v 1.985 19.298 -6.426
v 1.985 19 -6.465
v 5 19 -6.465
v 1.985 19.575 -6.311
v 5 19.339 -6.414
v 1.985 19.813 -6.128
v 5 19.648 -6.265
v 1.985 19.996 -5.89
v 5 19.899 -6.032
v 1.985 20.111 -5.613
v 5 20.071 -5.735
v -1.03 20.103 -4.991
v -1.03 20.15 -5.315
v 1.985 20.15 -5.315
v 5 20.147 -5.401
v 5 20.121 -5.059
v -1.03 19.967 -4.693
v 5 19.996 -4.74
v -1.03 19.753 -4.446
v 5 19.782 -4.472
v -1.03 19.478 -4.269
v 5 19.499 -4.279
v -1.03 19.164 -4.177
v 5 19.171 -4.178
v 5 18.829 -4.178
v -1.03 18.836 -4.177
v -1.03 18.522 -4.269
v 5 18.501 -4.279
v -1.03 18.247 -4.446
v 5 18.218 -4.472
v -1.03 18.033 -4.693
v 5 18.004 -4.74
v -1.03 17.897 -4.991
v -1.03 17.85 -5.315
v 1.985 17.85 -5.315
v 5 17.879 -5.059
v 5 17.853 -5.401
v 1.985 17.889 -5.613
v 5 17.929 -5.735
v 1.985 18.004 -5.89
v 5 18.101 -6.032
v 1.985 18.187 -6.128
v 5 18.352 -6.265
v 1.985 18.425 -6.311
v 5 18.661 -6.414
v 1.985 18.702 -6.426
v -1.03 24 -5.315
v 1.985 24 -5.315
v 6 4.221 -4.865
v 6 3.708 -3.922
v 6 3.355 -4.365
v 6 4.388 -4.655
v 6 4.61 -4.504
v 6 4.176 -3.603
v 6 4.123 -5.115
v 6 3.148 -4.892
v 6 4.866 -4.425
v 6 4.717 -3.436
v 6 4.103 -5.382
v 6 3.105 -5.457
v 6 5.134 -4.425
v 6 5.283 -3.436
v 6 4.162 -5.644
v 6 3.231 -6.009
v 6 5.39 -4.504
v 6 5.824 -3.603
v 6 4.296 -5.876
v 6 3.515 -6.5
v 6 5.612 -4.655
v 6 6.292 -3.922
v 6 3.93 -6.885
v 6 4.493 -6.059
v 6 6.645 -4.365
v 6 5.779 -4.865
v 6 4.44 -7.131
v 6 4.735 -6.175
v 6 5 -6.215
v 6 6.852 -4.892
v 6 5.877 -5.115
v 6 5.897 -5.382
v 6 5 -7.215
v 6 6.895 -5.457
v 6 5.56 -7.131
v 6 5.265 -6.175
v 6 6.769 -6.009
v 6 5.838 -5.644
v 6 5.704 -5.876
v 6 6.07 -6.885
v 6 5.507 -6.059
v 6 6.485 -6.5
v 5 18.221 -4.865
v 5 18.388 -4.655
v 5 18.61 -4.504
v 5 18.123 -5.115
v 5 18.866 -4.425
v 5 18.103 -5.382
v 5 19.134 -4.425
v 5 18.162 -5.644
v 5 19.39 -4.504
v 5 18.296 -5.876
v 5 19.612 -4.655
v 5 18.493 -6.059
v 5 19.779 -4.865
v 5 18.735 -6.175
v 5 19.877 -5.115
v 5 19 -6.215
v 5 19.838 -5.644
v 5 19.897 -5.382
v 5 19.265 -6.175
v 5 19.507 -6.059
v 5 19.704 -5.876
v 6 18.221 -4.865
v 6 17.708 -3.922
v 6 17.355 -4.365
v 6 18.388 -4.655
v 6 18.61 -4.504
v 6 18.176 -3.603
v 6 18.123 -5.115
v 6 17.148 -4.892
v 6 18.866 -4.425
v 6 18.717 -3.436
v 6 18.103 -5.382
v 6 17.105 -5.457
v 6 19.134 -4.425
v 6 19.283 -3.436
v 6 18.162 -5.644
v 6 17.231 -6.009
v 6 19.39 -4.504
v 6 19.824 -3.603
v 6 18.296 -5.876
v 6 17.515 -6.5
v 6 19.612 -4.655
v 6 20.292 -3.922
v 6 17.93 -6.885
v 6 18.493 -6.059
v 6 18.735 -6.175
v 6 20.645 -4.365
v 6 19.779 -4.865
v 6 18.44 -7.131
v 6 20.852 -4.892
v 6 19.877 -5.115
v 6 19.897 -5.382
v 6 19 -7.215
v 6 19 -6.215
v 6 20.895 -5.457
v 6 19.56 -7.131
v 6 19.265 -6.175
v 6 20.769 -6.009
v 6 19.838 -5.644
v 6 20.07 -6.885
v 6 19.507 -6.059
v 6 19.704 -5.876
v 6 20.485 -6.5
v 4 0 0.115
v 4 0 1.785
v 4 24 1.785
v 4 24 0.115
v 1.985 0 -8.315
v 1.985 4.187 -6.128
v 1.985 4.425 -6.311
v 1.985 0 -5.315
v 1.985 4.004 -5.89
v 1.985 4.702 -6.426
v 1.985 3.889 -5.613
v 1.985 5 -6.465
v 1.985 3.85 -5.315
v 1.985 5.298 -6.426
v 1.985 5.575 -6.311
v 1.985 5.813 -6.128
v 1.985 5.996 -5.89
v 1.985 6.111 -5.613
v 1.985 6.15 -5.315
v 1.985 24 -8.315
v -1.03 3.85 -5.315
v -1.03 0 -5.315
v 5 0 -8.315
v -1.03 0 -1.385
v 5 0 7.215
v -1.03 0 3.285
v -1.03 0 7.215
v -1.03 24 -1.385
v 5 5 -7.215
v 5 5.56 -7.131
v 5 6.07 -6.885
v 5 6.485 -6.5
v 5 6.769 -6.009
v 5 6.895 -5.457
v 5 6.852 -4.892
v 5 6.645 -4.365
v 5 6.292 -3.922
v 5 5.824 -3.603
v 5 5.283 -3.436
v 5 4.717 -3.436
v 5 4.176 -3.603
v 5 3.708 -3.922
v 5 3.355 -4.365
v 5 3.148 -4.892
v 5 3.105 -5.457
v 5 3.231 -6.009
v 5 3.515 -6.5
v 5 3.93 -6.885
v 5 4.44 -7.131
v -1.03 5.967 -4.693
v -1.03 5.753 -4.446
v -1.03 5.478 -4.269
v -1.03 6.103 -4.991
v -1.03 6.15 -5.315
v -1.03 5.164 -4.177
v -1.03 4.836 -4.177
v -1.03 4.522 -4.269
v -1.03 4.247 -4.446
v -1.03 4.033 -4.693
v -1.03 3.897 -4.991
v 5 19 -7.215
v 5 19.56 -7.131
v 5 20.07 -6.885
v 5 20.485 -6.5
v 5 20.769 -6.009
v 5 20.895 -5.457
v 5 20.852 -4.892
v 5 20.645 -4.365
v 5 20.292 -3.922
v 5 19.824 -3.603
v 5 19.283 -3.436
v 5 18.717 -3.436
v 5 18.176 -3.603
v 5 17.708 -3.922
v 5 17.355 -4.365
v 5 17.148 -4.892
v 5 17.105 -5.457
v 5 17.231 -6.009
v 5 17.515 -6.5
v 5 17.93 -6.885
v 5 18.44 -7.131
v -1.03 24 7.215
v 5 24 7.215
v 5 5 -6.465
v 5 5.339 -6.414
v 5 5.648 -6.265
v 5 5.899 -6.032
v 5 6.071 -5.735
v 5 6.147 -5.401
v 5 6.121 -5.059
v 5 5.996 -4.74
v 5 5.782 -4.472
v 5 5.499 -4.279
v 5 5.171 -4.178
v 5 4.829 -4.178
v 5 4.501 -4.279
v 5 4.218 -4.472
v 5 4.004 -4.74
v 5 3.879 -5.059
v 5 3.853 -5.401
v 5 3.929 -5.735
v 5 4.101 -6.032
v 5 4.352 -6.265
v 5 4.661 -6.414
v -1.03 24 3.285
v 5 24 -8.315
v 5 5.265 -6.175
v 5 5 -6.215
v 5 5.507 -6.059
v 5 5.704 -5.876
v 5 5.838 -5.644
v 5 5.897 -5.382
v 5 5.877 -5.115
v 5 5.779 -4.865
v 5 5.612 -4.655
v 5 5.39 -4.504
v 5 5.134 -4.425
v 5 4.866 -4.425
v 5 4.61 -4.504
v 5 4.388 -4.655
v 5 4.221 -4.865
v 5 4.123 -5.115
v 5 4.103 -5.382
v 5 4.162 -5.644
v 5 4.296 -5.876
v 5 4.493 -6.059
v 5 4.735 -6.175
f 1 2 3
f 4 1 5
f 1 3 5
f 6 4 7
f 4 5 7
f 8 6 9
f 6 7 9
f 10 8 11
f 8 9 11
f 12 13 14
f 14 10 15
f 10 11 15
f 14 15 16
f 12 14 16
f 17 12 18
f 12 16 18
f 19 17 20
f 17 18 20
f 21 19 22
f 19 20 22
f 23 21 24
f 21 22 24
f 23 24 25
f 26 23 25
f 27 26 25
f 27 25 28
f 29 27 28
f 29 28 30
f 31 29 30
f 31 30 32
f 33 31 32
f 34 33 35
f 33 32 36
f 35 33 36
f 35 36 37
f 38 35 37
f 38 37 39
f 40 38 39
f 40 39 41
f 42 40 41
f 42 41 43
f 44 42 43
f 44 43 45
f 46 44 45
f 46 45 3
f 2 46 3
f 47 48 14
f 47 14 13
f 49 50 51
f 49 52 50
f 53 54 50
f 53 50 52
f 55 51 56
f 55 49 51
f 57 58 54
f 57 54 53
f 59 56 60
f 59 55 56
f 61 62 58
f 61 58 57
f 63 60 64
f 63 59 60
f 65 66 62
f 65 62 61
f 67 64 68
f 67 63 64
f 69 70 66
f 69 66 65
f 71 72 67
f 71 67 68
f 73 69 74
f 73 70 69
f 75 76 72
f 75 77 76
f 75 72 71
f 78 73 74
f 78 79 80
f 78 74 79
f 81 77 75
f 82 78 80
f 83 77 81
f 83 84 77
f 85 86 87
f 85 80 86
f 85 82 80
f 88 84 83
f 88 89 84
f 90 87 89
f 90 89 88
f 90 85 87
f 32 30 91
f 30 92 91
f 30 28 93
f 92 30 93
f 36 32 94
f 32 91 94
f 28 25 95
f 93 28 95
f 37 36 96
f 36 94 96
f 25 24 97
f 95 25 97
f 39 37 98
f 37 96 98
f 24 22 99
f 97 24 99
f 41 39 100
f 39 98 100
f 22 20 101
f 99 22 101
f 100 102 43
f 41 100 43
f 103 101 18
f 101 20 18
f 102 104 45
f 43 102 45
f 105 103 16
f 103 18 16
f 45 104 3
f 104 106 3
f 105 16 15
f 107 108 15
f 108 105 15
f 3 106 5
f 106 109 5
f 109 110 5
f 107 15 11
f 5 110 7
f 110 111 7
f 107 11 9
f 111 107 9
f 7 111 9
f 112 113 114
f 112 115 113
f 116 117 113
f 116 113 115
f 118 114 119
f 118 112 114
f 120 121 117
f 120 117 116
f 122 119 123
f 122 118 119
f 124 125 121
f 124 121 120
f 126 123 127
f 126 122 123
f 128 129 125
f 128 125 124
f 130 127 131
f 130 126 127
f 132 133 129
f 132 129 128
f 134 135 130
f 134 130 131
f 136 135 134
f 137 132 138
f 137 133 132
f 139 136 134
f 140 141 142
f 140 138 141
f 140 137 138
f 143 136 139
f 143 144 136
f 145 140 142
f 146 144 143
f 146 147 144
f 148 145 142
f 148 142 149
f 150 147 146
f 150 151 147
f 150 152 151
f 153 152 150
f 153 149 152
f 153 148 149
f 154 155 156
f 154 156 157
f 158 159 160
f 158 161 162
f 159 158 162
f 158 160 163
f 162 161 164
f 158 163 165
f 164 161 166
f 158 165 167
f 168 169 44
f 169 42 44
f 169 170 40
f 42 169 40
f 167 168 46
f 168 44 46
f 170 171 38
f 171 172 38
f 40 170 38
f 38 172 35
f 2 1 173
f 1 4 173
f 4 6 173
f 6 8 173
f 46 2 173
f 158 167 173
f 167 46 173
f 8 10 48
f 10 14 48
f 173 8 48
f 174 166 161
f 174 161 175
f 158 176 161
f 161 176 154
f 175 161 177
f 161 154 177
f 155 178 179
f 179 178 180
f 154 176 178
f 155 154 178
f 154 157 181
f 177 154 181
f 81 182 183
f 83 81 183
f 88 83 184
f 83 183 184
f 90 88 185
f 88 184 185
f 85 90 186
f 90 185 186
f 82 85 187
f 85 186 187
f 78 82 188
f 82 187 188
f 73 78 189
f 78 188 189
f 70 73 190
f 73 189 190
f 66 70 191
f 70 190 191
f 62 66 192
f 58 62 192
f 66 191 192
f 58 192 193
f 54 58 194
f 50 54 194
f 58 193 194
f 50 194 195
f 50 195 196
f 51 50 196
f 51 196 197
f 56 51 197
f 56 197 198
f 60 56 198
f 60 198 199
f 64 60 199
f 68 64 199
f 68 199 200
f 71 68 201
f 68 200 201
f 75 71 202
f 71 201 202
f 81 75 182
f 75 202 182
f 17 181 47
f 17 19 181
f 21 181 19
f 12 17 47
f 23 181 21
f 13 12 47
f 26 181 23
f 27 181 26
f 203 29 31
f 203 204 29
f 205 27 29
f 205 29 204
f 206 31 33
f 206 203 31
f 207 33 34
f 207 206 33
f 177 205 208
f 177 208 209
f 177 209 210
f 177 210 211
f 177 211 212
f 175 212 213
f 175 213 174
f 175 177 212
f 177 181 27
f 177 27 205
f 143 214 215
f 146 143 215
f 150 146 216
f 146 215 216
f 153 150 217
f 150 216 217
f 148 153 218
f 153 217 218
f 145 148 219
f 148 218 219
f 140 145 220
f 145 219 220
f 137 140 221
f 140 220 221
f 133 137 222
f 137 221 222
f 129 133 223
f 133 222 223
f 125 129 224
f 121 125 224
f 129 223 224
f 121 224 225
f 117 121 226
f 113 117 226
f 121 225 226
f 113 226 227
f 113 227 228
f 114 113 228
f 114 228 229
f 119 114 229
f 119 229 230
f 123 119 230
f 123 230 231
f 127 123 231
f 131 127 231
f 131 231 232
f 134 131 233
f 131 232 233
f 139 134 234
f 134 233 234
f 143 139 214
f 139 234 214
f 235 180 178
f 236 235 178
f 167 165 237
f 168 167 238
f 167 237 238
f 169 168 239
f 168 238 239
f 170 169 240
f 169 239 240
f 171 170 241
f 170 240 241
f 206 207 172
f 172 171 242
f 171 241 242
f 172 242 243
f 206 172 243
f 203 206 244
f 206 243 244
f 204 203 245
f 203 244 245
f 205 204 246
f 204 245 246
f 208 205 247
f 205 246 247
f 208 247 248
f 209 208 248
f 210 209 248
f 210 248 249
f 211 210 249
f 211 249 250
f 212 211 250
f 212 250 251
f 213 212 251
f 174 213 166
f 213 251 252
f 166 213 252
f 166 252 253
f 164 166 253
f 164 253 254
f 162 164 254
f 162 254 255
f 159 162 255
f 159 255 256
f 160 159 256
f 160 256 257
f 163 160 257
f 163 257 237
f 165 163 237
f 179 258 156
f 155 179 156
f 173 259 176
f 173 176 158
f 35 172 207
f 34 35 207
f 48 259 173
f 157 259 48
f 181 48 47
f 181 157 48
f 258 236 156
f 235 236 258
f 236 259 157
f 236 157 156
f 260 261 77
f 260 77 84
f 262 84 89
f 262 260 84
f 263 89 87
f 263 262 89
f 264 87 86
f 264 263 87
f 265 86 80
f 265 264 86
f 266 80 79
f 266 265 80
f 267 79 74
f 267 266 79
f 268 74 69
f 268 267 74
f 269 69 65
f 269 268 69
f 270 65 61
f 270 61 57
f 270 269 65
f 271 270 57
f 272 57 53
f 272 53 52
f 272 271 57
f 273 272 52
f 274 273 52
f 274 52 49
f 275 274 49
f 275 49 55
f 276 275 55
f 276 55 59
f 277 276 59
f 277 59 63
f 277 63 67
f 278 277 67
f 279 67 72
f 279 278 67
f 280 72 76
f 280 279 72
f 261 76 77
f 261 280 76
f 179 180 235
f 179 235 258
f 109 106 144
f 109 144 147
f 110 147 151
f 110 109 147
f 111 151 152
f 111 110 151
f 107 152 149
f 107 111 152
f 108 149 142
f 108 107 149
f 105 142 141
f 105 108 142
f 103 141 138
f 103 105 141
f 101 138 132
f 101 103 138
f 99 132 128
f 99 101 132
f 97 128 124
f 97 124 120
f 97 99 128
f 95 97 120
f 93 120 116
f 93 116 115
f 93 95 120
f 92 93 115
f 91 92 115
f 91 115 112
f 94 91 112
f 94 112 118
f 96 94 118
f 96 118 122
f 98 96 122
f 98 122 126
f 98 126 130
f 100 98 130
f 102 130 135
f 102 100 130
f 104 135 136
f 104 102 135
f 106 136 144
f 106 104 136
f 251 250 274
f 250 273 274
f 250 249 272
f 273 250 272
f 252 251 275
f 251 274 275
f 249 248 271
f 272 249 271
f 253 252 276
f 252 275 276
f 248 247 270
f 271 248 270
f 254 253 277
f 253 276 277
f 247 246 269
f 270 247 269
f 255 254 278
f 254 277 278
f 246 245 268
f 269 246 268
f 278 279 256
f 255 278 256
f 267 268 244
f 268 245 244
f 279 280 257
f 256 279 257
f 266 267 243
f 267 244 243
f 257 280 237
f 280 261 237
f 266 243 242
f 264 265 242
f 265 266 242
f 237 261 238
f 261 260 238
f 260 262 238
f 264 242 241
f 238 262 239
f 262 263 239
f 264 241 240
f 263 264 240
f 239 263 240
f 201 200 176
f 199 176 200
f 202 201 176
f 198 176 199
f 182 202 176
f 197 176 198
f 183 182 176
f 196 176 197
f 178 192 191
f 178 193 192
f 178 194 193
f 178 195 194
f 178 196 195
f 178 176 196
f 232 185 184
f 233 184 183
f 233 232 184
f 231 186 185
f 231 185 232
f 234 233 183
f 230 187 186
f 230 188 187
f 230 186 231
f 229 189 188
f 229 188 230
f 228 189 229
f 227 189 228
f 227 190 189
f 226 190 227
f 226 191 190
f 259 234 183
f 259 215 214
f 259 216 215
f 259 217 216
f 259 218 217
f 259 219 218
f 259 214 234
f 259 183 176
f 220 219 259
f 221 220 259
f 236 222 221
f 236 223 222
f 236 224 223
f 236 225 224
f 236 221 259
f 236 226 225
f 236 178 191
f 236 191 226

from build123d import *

# Parameters (mm, degrees)
BOSS_EXTRUDE1_DEPTH = 24
SKETCH7_W           = 3.015
SKETCH7_H           = 24
BOSS_EXTRUDE3_DEPTH = 3
SKETCH3_R           = 1.9
SKETCH3_R_2         = 0.9
BOSS_EXTRUDE2_DEPTH = 1
SKETCH4_R           = 1.15
CUT_EXTRUDE2_DEPTH  = 23
CUT_EXTRUDE3_DEPTH  = 30


with BuildPart() as part:
    # Sketch1 → Boss-Extrude1 (new body)
    with BuildSketch(Plane(origin=(0, 0, 0), x_dir=(1, 0, 0), z_dir=(0, 1, 0))):
        Polygon((0.758759529, 5.315), (5, 5.315), (5, -7.215), (1.398203198, -7.215), (-1.03, -7.215), (-1.03, -1.785), (4, -1.785), (4, -0.115), (-1.03, -0.115), (-1.03, 5.315), align=None)
    extrude(amount=BOSS_EXTRUDE1_DEPTH)

    # Sketch7 → Boss-Extrude3 (add)
    with BuildSketch(Plane(origin=(0, 0, -5.315), x_dir=(-1, 0, 0), z_dir=(0, 0, -1))):
        with Locations((-3.4925, 12)):
            Rectangle(SKETCH7_W, SKETCH7_H)
    extrude(amount=BOSS_EXTRUDE3_DEPTH)

    # Sketch3 → Boss-Extrude2 (add)
    with BuildSketch(Plane(origin=(5, 0, 0), x_dir=(0, 0, -1), z_dir=(1, 0, 0))):
        with Locations((5.315, 19)):
            Circle(SKETCH3_R)
        with Locations((5.315, 19)):
            Circle(SKETCH3_R_2, mode=Mode.SUBTRACT)
        with Locations((5.315, 5)):
            Circle(SKETCH3_R)
        with Locations((5.315, 5)):
            Circle(SKETCH3_R_2, mode=Mode.SUBTRACT)
    extrude(amount=BOSS_EXTRUDE2_DEPTH)

    # Sketch4 → Cut-Extrude2 (cut)
    with BuildSketch(Plane(origin=(5, 0, 0), x_dir=(0, 0, -1), z_dir=(1, 0, 0))):
        with Locations((5.315, 19)):
            Circle(SKETCH4_R)
        with Locations((5.315, 5)):
            Circle(SKETCH4_R)
    extrude(amount=-CUT_EXTRUDE2_DEPTH, mode=Mode.SUBTRACT)

    # Sketch6 → Cut-Extrude3 (cut)
    with BuildSketch(Plane(origin=(0, 24, 0), x_dir=(1, 0, 0), z_dir=(0, 1, 0))):
        Polygon((-1.03, -0.115), (4, -0.115), (-1.03, 1.385), align=None)
        Polygon((4, -1.785), (-1.03, -1.785), (-1.03, -3.285), align=None)
    extrude(amount=-CUT_EXTRUDE3_DEPTH, mode=Mode.SUBTRACT)


solid = part.part
